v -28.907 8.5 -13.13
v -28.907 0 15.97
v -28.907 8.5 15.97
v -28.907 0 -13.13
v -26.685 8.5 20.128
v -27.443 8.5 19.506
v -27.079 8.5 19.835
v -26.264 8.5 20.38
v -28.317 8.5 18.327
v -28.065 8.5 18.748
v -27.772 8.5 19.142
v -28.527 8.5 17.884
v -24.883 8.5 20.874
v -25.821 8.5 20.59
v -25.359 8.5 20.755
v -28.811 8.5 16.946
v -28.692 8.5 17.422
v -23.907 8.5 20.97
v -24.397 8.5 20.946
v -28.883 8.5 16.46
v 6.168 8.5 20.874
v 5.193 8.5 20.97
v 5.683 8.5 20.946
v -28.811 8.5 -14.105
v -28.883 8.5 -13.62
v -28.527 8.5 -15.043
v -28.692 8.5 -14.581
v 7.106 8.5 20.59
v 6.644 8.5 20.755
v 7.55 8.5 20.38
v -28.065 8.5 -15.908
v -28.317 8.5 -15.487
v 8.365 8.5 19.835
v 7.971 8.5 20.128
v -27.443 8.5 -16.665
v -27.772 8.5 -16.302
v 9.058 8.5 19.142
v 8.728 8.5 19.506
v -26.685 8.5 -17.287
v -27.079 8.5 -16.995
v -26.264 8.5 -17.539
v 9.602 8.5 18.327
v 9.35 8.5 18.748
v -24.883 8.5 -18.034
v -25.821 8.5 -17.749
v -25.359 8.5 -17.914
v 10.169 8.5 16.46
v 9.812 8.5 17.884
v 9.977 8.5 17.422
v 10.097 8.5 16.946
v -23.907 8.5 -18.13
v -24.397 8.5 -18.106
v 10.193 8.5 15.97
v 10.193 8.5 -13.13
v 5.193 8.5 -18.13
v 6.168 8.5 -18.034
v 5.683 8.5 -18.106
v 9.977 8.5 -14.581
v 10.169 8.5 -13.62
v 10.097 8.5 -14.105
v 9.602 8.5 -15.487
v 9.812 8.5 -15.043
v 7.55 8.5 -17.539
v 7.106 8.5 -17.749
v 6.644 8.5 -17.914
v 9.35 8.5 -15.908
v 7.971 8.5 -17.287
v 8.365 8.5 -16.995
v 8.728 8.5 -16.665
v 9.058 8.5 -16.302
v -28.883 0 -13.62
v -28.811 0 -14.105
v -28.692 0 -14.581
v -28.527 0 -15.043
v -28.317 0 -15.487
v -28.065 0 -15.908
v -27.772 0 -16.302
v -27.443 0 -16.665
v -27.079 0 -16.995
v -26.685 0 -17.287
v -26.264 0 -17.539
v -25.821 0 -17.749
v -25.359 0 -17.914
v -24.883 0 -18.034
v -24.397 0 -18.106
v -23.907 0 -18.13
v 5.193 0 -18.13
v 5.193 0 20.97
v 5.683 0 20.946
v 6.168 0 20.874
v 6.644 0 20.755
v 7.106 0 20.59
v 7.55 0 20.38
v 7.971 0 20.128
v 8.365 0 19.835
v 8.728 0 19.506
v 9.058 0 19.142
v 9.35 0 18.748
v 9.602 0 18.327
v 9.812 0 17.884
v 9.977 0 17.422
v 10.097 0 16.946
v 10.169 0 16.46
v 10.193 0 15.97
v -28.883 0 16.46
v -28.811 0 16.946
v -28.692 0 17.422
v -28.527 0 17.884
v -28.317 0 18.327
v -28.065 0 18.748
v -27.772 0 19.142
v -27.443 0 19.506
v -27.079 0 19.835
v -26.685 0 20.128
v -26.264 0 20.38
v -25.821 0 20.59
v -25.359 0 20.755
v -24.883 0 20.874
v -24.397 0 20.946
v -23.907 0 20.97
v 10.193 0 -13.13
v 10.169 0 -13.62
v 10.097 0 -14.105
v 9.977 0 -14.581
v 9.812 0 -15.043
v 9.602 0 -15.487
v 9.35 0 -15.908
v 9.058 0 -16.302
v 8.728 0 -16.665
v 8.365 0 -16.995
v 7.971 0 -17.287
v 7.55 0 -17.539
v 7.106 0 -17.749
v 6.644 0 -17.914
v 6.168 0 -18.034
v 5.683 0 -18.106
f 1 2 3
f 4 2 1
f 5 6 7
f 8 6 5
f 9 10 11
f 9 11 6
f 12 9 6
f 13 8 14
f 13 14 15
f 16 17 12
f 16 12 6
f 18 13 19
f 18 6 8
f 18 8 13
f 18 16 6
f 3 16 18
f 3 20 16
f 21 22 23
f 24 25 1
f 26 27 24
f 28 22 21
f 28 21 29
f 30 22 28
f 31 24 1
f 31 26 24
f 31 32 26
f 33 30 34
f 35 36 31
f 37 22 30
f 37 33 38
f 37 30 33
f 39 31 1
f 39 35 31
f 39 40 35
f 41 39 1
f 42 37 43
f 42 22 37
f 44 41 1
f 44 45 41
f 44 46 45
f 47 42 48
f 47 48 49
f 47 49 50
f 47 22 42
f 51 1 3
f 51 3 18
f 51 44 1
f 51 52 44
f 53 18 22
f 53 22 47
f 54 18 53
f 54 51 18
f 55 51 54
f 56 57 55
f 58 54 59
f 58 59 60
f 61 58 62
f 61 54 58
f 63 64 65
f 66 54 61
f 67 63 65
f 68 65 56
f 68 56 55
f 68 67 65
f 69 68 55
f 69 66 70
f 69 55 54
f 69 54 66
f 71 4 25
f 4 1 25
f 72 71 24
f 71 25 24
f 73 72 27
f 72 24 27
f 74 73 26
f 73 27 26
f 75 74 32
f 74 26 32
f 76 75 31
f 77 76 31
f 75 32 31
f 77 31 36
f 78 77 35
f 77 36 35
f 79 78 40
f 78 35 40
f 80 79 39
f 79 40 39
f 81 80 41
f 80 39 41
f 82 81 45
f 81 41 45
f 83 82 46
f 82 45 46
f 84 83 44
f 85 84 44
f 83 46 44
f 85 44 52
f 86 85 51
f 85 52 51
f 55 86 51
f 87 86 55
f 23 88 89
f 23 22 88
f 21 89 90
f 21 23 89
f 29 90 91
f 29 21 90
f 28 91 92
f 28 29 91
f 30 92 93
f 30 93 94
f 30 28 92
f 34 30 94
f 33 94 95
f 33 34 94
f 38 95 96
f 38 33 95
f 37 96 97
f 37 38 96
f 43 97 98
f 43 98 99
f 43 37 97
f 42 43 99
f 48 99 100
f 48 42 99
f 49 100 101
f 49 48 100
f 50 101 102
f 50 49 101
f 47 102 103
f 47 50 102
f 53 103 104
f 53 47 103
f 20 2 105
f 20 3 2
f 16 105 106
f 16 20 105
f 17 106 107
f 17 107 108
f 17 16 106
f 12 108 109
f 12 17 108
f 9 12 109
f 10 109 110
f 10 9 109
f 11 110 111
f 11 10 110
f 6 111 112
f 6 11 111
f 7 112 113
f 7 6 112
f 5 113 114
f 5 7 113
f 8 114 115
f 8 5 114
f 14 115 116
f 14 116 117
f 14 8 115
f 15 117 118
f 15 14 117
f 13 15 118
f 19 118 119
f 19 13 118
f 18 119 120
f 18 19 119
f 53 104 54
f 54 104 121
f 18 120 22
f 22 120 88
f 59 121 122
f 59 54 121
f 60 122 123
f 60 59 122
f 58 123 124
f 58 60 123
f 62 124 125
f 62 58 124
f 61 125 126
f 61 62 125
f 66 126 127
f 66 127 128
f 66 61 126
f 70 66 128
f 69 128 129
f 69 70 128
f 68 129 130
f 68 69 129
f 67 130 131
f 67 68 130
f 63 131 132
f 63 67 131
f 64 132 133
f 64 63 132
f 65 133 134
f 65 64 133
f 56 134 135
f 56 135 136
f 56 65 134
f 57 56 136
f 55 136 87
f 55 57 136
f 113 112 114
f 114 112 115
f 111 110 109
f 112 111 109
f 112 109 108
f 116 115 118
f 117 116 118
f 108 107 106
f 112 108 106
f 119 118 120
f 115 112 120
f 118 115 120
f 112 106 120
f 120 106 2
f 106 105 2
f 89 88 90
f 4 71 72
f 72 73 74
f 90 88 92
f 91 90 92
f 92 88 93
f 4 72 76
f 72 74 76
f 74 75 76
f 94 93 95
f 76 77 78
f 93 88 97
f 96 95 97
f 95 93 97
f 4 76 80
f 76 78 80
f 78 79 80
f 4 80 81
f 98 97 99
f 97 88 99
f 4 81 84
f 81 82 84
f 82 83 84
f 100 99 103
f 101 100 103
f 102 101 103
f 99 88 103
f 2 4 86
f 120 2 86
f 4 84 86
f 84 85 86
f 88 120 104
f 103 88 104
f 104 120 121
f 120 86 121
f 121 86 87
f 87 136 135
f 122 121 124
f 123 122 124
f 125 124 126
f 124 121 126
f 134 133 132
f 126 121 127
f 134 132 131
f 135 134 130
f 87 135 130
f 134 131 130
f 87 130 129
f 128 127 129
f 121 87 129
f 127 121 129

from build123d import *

# Parameters (mm, degrees)
SKETCH_1_W      = 39.1
SKETCH_1_H      = 39.1
EXTRUDE_1_DEPTH = 8.5
FILLET_1_R      = 5


with BuildPart() as part:
    # 草图1 → 凸台-拉伸1 (new body)
    with BuildSketch(Plane(origin=(0, 0, 0), x_dir=(1, 0, 0), z_dir=(0, 1, 0))):
        with Locations((-9.357264957, -1.420299145)):
            Rectangle(SKETCH_1_W, SKETCH_1_H)
    extrude(amount=EXTRUDE_1_DEPTH)

    # 圆角1
    fillet_1_edges = [part.edges().sort_by_distance(p)[0] for p in [
        (10.192735043, 4.25, 20.970299145),
        (-28.907264957, 4.25, 20.970299145),
        (-28.907264957, 4.25, -18.129700855),
        (10.192735043, 4.25, -18.129700855),
    ]]
    fillet(fillet_1_edges, radius=FILLET_1_R)


solid = part.part
